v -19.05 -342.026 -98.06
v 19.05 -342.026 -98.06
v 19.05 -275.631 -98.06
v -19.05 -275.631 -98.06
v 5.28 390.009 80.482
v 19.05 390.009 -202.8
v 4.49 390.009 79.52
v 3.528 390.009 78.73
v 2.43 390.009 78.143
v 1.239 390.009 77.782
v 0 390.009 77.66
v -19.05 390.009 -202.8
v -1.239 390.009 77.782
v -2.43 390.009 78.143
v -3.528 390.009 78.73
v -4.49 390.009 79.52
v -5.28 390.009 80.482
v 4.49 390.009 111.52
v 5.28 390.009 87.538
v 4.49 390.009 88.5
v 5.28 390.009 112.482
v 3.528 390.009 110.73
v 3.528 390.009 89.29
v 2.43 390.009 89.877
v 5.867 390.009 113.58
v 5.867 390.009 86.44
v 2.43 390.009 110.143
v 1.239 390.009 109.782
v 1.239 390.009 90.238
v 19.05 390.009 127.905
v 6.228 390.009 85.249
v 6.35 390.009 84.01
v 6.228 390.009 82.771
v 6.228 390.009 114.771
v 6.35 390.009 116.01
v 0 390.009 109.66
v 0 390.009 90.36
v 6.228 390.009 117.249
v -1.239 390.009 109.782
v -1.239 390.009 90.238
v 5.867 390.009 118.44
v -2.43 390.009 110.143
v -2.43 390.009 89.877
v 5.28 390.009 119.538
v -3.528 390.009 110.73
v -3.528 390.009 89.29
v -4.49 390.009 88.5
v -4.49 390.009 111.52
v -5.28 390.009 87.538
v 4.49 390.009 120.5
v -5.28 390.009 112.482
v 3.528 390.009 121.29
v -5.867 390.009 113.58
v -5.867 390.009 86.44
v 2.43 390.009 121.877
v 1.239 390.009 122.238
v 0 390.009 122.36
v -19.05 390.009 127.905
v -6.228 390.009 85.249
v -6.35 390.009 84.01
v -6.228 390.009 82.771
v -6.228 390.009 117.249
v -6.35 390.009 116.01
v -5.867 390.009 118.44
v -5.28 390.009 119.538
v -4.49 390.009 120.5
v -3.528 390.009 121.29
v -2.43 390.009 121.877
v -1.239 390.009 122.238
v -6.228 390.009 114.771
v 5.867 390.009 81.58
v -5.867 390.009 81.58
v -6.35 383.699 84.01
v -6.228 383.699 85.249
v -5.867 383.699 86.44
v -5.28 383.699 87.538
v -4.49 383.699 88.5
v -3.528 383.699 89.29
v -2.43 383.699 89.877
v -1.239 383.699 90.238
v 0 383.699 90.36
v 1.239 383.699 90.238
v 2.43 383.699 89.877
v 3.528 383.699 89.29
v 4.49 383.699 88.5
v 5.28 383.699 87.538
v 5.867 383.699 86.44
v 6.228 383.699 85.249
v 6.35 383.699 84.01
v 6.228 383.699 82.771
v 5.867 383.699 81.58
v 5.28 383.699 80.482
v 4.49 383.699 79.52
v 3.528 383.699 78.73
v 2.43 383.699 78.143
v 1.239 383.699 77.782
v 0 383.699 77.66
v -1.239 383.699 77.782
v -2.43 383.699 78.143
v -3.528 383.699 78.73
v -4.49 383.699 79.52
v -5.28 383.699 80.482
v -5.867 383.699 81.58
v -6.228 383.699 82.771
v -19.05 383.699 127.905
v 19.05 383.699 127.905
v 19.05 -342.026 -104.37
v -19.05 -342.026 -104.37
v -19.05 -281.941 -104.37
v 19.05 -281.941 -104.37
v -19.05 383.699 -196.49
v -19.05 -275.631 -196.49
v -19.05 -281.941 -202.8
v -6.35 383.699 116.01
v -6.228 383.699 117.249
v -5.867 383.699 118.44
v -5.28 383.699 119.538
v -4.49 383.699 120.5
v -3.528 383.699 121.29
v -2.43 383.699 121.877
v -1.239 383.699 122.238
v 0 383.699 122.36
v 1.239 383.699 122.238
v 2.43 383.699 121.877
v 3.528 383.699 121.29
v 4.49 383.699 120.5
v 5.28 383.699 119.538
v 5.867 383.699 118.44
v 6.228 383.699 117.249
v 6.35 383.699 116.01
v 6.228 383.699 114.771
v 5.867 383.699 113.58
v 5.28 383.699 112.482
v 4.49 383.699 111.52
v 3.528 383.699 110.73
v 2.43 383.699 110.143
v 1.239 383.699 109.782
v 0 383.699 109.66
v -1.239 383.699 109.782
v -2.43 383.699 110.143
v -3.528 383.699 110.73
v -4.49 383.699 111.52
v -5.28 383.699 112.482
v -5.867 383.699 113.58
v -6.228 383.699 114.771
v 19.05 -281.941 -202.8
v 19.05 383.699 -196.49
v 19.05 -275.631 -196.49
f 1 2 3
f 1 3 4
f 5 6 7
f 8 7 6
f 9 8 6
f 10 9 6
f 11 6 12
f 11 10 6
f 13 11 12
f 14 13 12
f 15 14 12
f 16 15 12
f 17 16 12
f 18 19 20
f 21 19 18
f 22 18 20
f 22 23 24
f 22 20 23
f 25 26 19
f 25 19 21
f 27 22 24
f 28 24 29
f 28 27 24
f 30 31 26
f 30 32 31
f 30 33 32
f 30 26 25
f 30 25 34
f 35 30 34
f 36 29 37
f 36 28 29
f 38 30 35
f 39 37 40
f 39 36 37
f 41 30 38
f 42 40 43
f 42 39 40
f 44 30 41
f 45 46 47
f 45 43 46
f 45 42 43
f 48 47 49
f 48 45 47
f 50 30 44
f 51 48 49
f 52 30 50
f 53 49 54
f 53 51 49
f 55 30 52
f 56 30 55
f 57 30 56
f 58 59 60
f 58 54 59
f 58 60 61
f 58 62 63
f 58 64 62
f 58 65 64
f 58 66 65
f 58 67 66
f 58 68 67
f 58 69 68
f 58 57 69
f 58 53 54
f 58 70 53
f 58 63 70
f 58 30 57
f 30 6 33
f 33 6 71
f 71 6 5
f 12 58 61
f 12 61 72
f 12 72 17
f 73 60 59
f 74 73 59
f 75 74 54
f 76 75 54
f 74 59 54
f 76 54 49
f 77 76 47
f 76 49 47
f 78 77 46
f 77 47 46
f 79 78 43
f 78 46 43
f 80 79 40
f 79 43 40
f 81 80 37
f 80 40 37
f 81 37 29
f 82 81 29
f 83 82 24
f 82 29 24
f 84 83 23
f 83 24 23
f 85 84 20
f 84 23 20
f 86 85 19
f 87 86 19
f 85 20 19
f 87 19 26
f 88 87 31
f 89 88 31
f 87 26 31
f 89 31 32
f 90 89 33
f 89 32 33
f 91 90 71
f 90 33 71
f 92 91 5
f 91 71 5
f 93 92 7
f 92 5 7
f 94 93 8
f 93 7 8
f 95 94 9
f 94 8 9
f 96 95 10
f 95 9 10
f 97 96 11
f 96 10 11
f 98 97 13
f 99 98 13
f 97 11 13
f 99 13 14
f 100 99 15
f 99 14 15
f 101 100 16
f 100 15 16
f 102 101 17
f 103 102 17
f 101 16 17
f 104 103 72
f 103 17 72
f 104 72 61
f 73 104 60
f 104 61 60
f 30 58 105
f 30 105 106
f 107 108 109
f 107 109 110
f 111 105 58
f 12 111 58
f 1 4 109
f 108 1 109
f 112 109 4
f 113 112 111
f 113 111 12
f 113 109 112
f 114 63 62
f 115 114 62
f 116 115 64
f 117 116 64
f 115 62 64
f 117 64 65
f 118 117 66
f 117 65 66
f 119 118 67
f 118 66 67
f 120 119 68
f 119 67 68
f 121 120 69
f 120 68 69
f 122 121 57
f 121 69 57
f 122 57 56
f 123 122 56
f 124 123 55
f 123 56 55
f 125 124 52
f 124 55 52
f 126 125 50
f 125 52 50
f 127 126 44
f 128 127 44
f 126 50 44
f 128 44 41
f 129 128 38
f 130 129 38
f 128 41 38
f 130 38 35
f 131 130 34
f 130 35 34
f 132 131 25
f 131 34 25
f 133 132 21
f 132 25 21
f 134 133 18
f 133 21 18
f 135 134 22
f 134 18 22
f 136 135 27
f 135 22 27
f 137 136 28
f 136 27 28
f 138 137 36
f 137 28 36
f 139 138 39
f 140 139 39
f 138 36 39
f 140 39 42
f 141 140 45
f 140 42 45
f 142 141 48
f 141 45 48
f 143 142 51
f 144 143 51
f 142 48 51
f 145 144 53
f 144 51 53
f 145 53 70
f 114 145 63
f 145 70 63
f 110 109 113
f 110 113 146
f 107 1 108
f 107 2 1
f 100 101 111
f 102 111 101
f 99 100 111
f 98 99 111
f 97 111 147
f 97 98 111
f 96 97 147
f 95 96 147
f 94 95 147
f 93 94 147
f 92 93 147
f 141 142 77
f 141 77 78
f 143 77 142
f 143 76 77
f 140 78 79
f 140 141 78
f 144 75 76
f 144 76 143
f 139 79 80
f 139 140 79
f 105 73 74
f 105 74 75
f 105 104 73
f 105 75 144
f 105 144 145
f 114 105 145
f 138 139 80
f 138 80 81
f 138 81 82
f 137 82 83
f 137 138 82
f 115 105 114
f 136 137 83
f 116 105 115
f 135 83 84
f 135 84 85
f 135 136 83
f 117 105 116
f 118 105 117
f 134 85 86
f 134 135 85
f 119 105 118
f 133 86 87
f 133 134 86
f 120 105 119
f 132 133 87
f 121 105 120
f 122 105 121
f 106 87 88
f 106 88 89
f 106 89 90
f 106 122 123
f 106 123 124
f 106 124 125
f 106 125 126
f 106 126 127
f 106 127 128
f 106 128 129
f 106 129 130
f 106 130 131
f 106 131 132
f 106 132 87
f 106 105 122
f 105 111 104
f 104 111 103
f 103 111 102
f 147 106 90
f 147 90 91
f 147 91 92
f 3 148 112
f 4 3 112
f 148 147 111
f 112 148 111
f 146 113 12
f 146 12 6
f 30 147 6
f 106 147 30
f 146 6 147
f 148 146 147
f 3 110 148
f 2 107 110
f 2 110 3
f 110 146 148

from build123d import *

# Parameters (mm, degrees)
CROQUIS1_W              = 38.1
CROQUIS1_H              = 850.5
SALIENTE_EXTRUIR1_DEPTH = 6.31
CROQUIS2_W              = 38.1
CROQUIS2_H              = 6.31
SALIENTE_EXTRUIR2_DEPTH = 70
CROQUIS3_W              = 38.1
CROQUIS3_H              = 6.31
SALIENTE_EXTRUIR3_DEPTH = 578
CROQUIS4_R              = 6.935856655
CORTAR_EXTRUIR1_DEPTH   = 7
CROQUIS5_W              = 38.1
CROQUIS5_H              = 687.72607772
CORTAR_EXTRUIR2_DEPTH   = 10
CROQUIS6_W              = 38.1
CROQUIS6_H              = 6.31
CROQUIS8_W              = 368.89
CROQUIS8_H              = 6.31
CORTAR_EXTRUIR3_DEPTH   = 147
CROQUIS9_R              = 6.35
CORTAR_EXTRUIR4_DEPTH   = 6.31
CROQUIS10_W             = 38.1
CROQUIS10_H             = 6.31


with BuildPart() as part:
    # Croquis1 → Saliente-Extruir1 (new body)
    with BuildSketch(Plane.XY):
        Rectangle(CROQUIS1_W, CROQUIS1_H)
    extrude(amount=SALIENTE_EXTRUIR1_DEPTH)

    # Croquis2 → Saliente-Extruir2 (add)
    with BuildSketch(Plane.XY.offset(6.31)):
        with Locations((0, -422.095)):
            Rectangle(CROQUIS2_W, CROQUIS2_H)
    extrude(amount=SALIENTE_EXTRUIR2_DEPTH)

    # Croquis3 → Saliente-Extruir3 (add)
    with BuildSketch(Plane.XY.offset(6.31)):
        with Locations((0, -265.63107772)):
            Rectangle(CROQUIS3_W, CROQUIS3_H)
    extrude(amount=-SALIENTE_EXTRUIR3_DEPTH)

    # Croquis4 → Cortar-Extruir1 (cut)
    with BuildSketch(Plane(origin=(0, -262.47607772, 0), x_dir=(1, 0, 0), z_dir=(0, 1, 0))):
        with Locations(Location((0, 536.981534281, 0), (0, 0, 270))):
            Circle(CROQUIS4_R)
    extrude(amount=-CORTAR_EXTRUIR1_DEPTH, mode=Mode.SUBTRACT)

    # Croquis5 → Cortar-Extruir2 (cut)
    with BuildSketch(Plane(origin=(0, 0, 0), x_dir=(-1, 0, 0), z_dir=(0, 0, -1))):
        with Locations((0, 81.38696114)):
            Rectangle(CROQUIS5_W, CROQUIS5_H)
    extrude(amount=-CORTAR_EXTRUIR2_DEPTH, mode=Mode.SUBTRACT)

    # Barrer1: sweep along a curve in space
    with BuildLine() as barrer1_path:
        Line((0, -262.47607772, -199.645), (0, 386.85392228, -199.645))
        Line((0, 386.85392228, -199.645), (0, 386.85392228, 127.905))
    # Croquis6 → Barrer1 (sweep)
    with BuildSketch(Plane(origin=(0, -262.47607772, 0), x_dir=(1, 0, 0), z_dir=(0, 1, 0))):
        with Locations((0, 199.645)):
            Rectangle(CROQUIS6_W, CROQUIS6_H)
    sweep(path=barrer1_path.line, transition=Transition.RIGHT)

    # Croquis8 → Cortar-Extruir3 (cut)
    with BuildSketch(Plane(origin=(19.05, 0, 0), x_dir=(0, 0, -1), z_dir=(1, 0, 0))):
        Polygon((196.49, -262.47607772), (196.49, -268.78607772), (196.49, -444.307673596), (-90.834600665, -444.307673596), (-90.834600665, -262.47607772), align=None)
        with Locations((387.245, -265.63107772)):
            Rectangle(CROQUIS8_W, CROQUIS8_H)
    extrude(amount=-CORTAR_EXTRUIR3_DEPTH, mode=Mode.SUBTRACT)

    # Croquis9 → Cortar-Extruir4 (cut)
    with BuildSketch(Plane(origin=(0, 390.00892228, 0), x_dir=(1, 0, 0), z_dir=(0, 1, 0))):
        with Locations(Location((0, -84.010000001, 0), (0, 0, 180))):
            Circle(CROQUIS9_R)
        with Locations(Location((0, -116.010000001, 0), (0, 0, 180))):
            Circle(CROQUIS9_R)
    extrude(amount=-CORTAR_EXTRUIR4_DEPTH, mode=Mode.SUBTRACT)

    # Barrer2: sweep along a curve in space
    with BuildLine() as barrer2_path:
        Line((0, -268.78607772, -199.645), (0, -278.78607772, -199.645))
        Line((0, -278.78607772, -199.645), (0, -278.78607772, -101.215))
        Line((0, -278.78607772, -101.215), (0, -342.02607772, -101.215))
    # Croquis10 → Barrer2 (sweep)
    with BuildSketch(Plane.XZ.offset(268.78607772)):
        with Locations((0, -199.645)):
            Rectangle(CROQUIS10_W, CROQUIS10_H)
    sweep(path=barrer2_path.line, transition=Transition.RIGHT)


solid = part.part
